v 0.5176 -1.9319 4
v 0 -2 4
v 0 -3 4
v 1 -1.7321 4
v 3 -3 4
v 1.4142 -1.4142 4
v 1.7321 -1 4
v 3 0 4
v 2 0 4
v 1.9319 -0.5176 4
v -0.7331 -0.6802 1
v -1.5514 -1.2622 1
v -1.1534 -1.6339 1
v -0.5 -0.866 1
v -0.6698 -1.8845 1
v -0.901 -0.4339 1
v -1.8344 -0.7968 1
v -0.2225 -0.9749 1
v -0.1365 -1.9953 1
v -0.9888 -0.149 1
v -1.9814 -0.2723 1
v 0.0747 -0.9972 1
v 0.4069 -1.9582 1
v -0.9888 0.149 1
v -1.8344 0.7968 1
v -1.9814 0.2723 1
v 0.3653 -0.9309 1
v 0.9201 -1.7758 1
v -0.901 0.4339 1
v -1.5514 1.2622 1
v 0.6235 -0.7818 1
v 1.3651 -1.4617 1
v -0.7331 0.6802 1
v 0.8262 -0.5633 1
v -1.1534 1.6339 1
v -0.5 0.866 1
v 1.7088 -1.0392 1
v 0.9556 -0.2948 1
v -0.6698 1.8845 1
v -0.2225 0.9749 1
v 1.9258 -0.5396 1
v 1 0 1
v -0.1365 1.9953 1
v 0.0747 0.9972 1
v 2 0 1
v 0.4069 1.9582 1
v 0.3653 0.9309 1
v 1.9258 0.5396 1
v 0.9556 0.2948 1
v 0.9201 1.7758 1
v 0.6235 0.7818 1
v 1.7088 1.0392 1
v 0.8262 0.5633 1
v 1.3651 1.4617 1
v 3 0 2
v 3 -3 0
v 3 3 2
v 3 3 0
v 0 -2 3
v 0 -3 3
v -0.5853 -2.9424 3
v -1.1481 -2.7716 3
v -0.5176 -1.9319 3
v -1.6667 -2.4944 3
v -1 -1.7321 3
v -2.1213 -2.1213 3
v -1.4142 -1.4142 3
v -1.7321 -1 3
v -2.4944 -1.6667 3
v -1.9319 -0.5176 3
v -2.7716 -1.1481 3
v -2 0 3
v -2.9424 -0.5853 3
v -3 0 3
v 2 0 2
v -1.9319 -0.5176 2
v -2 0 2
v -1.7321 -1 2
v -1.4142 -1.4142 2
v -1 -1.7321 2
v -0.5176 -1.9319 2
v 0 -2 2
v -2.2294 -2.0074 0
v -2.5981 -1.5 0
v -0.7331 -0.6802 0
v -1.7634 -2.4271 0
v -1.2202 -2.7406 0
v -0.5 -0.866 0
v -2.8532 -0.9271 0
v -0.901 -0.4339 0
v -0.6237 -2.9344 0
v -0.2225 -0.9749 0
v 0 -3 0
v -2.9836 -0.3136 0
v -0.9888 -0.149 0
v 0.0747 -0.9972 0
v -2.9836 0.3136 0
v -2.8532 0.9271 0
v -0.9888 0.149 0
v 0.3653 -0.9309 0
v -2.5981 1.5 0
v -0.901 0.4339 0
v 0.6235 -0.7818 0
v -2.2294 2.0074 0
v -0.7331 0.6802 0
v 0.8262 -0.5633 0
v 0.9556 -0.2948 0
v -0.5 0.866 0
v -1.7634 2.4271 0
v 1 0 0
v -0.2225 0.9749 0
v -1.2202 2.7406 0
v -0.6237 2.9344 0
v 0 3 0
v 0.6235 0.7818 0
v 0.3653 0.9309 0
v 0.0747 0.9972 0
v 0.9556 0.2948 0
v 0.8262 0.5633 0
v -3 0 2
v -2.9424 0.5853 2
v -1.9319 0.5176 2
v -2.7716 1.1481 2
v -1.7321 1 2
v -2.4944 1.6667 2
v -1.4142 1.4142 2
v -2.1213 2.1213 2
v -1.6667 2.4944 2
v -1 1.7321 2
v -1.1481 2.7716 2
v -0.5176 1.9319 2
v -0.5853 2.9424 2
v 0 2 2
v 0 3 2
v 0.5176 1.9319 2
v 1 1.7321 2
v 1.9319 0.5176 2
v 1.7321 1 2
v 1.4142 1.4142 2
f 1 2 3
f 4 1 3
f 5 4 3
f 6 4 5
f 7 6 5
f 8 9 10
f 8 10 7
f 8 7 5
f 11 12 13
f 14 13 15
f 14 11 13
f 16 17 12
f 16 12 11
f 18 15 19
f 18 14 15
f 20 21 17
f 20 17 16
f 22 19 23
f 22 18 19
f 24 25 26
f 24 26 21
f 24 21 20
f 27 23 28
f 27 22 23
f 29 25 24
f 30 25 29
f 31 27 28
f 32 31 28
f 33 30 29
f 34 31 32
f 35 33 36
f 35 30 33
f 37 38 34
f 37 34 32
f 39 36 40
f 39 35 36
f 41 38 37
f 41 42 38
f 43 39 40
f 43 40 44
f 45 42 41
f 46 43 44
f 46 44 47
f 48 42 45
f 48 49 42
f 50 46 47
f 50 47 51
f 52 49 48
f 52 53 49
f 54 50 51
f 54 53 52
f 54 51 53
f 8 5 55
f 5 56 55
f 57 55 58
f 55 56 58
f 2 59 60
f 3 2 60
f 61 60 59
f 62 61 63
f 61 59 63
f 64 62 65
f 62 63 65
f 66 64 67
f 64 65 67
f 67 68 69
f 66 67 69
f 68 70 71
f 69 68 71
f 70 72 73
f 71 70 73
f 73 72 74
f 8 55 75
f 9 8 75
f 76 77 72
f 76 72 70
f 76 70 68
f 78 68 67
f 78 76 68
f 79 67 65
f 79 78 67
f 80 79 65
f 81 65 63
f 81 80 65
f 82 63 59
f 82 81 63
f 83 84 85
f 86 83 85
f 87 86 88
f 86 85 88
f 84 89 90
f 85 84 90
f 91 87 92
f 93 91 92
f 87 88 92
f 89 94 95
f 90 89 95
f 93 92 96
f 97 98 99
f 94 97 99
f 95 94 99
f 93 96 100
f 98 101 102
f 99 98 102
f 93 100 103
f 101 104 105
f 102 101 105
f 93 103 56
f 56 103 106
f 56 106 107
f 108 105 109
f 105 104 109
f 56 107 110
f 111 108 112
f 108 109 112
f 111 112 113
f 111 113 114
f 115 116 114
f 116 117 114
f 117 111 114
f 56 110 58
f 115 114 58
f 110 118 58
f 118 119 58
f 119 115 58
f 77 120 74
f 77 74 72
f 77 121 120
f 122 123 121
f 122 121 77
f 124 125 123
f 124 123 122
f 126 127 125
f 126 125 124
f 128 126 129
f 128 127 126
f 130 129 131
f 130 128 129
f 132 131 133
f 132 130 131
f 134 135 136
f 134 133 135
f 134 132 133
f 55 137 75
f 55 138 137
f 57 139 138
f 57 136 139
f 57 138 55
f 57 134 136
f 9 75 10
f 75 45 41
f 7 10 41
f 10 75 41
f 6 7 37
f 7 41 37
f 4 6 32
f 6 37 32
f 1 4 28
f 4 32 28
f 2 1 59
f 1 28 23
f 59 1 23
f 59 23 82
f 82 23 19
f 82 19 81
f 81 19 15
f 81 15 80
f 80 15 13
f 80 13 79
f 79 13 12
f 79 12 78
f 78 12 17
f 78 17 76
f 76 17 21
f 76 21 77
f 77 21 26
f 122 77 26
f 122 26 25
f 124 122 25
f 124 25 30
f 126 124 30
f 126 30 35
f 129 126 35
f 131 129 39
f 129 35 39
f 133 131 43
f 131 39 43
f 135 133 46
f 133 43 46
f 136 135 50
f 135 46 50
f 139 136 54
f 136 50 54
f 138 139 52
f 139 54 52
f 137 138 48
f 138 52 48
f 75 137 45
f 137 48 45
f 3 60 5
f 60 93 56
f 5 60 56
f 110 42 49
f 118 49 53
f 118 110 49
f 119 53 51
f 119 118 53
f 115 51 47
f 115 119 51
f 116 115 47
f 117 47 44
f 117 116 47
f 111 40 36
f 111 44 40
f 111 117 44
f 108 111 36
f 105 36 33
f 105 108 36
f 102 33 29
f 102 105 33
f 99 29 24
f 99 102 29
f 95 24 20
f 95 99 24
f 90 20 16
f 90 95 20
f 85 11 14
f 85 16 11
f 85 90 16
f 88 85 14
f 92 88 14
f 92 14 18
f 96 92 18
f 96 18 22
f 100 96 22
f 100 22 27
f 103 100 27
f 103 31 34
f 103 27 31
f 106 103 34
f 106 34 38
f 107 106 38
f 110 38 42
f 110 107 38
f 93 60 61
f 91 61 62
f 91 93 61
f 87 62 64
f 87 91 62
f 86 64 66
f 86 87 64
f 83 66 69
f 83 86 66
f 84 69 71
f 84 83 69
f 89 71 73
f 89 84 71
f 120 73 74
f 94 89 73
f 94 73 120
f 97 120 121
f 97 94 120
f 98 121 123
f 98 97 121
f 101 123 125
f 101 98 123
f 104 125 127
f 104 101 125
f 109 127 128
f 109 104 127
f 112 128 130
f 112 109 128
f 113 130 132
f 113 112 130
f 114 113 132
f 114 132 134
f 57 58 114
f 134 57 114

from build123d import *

# Parameters (mm, degrees)
SKETCH1_R           = 1
BOSS_EXTRUDE1_DEPTH = 2
SKETCH2_R           = 2
CUT_EXTRUDE1_DEPTH  = 1
BOSS_EXTRUDE2_DEPTH = 2
BOSS_EXTRUDE3_DEPTH = 1


with BuildPart() as part:
    # Sketch1 → Boss-Extrude1 (new body)
    with BuildSketch(Plane.XY):
        with BuildLine():
            Line((3, 0), (3, 3))
            Line((3, 3), (0, 3))
            ThreePointArc((0, 3), (-3, 0), (0, -3))
            Line((0, -3), (3, -3))
            Line((3, -3), (3, 0))
        make_face()
        Circle(SKETCH1_R, mode=Mode.SUBTRACT)
    extrude(amount=BOSS_EXTRUDE1_DEPTH)

    # Sketch2 → Cut-Extrude1 (cut)
    with BuildSketch(Plane.XY.offset(2)):
        Circle(SKETCH2_R)
    extrude(amount=-CUT_EXTRUDE1_DEPTH, mode=Mode.SUBTRACT)

    # Sketch3 → Boss-Extrude2 (add)
    with BuildSketch(Plane.XY.offset(2)):
        with BuildLine():
            Line((0, -2), (0, -3))
            Line((0, -3), (3, -3))
            Line((3, -3), (3, 0))
            Line((3, 0), (2, 0))
            ThreePointArc((2, 0), (1.414213562, -1.414213562), (0, -2))
        make_face()
    extrude(amount=BOSS_EXTRUDE2_DEPTH)

    # Sketch4 → Boss-Extrude3 (add)
    with BuildSketch(Plane.XY.offset(2)):
        with BuildLine():
            Line((-3, 0), (-2, 0))
            ThreePointArc((-2, 0), (-1.414213562, -1.414213562), (0, -2))
            Line((0, -2), (0, -3))
            ThreePointArc((0, -3), (-2.121320344, -2.121320344), (-3, 0))
        make_face()
    extrude(amount=BOSS_EXTRUDE3_DEPTH)


solid = part.part
